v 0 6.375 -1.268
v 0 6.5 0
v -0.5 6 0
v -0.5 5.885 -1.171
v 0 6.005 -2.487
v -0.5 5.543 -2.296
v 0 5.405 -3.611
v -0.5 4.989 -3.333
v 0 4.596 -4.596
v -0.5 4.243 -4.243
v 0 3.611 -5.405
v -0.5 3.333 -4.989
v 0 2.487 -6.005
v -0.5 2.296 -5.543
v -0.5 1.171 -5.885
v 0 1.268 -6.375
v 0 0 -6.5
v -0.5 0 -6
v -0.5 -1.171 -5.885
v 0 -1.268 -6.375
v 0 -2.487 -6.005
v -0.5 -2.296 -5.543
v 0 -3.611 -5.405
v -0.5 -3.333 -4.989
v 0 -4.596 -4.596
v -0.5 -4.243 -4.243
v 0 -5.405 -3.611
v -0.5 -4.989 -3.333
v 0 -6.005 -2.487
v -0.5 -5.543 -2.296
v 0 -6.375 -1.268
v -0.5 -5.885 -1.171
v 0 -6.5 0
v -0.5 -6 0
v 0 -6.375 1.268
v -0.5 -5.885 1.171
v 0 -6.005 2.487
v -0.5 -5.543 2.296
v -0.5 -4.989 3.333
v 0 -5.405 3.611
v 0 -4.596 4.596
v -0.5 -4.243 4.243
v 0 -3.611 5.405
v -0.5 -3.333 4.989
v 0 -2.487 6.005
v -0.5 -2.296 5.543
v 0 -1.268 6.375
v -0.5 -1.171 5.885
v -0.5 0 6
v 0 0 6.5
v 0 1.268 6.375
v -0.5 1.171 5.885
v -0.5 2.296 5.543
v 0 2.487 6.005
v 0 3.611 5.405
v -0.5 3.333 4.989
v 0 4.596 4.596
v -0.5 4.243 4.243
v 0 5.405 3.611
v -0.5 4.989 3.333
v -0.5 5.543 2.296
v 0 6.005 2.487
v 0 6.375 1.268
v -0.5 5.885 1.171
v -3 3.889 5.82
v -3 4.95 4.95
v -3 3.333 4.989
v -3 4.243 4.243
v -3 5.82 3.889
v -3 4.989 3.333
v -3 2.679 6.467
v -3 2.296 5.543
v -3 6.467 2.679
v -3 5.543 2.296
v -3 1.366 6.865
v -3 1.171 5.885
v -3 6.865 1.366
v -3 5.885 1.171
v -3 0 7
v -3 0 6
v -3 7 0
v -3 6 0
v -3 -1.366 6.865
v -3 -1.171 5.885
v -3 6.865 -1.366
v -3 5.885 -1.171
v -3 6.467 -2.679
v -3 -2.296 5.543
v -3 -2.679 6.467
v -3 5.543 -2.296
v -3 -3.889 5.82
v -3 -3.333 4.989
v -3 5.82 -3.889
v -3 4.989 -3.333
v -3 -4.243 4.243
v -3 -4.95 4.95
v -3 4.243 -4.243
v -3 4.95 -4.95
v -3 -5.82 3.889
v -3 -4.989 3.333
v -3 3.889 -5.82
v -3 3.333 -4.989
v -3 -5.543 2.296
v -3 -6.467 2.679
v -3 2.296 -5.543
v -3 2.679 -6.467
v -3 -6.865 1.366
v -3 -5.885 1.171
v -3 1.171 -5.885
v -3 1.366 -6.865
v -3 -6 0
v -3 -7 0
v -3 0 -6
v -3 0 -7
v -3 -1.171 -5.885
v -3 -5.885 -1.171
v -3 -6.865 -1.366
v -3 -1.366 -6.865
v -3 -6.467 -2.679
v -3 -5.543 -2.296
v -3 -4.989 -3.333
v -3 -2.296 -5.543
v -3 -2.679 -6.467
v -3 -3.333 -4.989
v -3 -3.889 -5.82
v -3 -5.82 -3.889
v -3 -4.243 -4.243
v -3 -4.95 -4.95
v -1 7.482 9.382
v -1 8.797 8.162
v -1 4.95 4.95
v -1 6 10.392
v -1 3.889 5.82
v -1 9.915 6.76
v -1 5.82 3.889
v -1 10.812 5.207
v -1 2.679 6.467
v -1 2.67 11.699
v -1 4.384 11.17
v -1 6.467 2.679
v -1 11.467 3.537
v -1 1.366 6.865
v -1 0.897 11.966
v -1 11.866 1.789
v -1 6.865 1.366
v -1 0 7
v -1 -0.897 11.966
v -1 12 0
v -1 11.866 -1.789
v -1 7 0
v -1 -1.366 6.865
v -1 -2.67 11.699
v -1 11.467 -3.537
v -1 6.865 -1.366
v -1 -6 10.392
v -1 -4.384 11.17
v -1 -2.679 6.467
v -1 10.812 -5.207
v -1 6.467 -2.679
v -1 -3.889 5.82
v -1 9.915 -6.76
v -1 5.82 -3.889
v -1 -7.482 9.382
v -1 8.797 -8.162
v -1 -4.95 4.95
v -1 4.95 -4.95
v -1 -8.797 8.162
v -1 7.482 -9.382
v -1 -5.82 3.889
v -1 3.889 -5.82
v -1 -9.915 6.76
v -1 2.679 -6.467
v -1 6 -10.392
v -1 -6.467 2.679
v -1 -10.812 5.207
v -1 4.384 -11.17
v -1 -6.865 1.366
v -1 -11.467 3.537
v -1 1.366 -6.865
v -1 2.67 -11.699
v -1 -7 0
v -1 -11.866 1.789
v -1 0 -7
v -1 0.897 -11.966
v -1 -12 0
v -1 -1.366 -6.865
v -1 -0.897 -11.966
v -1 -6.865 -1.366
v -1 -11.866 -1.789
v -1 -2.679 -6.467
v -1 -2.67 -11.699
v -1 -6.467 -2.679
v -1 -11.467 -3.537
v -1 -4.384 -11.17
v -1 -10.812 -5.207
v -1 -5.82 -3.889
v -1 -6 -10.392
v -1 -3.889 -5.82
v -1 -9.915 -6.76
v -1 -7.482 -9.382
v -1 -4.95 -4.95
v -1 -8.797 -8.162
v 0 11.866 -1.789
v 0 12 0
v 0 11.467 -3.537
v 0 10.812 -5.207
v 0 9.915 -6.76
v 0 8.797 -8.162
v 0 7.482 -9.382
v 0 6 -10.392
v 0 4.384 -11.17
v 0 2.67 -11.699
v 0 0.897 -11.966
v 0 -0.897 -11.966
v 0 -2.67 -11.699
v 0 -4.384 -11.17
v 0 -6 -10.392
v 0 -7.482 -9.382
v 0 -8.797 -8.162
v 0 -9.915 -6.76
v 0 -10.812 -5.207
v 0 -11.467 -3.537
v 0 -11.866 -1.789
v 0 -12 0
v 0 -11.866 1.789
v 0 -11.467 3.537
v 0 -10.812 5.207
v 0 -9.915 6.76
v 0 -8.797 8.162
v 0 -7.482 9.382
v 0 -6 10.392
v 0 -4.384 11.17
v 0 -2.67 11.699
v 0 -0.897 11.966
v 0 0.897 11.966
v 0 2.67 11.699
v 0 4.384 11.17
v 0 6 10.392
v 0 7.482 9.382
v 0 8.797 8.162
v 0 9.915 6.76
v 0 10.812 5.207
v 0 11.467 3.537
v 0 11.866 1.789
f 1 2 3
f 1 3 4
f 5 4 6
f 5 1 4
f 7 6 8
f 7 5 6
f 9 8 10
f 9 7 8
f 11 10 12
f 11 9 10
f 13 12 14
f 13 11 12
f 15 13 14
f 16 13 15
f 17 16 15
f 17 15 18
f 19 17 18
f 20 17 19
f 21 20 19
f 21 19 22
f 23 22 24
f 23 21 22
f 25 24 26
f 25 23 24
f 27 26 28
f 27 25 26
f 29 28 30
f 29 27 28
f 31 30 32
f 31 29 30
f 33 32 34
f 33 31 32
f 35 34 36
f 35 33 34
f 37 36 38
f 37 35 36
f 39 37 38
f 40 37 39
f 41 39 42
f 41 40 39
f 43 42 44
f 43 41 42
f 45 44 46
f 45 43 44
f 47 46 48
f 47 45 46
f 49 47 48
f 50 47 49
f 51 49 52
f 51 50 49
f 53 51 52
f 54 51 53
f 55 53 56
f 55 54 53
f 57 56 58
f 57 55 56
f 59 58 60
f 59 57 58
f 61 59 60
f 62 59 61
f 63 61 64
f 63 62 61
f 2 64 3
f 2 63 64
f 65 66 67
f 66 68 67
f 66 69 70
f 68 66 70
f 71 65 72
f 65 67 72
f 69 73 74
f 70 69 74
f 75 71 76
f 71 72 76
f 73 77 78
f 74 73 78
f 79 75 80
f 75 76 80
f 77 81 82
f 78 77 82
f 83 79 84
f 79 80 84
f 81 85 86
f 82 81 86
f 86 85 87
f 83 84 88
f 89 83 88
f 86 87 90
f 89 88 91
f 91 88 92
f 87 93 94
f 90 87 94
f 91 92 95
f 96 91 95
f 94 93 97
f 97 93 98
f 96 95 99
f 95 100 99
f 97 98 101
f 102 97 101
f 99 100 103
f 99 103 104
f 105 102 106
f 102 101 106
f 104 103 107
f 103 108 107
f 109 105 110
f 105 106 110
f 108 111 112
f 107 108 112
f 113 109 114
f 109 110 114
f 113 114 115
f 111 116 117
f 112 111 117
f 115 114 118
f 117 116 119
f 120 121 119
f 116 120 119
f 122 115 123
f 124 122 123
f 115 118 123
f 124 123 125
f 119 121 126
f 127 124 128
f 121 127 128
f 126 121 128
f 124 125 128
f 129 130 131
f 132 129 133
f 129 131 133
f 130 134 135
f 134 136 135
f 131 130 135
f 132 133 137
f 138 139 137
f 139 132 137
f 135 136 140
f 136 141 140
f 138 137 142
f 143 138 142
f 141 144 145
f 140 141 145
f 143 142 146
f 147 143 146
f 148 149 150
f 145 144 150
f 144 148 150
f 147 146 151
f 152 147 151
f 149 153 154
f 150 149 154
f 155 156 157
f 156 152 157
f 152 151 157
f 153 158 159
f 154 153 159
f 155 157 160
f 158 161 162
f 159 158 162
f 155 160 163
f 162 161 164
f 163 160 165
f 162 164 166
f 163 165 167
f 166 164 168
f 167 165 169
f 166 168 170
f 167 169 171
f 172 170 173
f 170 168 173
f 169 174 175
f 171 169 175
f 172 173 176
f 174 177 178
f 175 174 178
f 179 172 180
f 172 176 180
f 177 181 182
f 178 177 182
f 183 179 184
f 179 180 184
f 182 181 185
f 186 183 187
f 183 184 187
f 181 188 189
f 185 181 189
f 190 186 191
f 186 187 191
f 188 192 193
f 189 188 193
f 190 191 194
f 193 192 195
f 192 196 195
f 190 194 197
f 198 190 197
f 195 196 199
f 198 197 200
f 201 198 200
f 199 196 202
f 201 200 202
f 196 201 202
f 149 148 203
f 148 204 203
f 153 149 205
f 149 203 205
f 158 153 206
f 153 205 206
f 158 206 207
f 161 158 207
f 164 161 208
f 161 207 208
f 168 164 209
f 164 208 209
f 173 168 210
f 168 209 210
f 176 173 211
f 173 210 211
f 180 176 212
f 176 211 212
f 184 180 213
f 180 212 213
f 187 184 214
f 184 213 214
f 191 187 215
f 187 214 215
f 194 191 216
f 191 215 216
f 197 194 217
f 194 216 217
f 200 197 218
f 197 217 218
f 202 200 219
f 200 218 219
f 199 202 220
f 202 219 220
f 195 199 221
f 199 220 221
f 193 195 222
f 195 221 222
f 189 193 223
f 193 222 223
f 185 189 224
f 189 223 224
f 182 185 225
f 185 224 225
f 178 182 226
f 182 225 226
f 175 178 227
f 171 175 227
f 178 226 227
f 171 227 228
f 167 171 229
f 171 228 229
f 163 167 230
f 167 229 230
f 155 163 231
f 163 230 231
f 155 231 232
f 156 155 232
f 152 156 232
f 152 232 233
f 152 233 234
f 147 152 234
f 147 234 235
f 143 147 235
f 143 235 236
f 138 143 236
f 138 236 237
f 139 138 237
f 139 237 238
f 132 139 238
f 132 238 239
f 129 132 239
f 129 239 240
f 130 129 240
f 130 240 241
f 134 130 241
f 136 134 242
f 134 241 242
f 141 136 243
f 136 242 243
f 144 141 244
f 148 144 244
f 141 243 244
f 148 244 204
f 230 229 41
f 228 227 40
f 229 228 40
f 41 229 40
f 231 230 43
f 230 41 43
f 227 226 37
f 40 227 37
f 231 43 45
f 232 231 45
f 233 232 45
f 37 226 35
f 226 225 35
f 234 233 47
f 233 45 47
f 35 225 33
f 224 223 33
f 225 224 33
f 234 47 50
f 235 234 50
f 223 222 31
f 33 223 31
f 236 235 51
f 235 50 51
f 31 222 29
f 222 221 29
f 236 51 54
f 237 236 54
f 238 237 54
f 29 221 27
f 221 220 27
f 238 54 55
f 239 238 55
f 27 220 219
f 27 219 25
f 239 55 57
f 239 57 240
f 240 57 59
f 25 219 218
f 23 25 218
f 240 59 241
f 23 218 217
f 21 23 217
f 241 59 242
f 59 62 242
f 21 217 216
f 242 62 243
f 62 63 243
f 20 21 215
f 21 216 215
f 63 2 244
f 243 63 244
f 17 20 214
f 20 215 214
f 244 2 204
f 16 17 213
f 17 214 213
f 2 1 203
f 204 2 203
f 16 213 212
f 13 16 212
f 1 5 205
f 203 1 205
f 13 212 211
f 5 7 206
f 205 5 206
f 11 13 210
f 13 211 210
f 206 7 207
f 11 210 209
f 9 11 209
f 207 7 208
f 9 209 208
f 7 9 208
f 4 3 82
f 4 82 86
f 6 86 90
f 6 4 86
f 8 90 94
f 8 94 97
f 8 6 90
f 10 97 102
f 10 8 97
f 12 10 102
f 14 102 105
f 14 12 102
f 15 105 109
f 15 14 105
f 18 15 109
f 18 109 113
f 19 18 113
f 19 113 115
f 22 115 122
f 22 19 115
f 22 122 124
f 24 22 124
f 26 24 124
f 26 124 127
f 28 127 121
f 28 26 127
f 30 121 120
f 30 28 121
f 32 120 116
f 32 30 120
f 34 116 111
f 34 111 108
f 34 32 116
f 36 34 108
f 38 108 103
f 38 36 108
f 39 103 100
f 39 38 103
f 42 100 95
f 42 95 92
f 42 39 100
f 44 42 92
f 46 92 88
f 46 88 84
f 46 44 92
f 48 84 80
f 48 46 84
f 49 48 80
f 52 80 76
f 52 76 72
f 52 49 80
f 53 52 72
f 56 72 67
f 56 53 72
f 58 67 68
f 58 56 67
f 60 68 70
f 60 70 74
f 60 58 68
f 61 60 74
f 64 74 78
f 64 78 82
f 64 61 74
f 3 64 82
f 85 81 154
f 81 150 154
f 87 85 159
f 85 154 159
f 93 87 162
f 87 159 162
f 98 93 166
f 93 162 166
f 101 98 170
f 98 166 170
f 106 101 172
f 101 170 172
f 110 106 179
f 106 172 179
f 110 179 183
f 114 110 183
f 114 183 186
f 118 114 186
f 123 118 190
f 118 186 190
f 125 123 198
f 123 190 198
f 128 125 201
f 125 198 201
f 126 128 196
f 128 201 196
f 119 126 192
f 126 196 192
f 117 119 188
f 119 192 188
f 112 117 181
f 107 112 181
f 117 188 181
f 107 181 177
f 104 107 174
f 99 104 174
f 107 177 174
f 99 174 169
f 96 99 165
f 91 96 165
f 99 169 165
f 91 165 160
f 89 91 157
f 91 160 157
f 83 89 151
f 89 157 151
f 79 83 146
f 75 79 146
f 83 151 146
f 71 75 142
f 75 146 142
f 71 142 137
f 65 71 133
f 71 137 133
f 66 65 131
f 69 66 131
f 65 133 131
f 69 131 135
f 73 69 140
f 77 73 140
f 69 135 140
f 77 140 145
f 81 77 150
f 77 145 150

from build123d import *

# Parameters (mm, degrees)
CHAMFER1_SIZE = 0.5


with BuildPart() as part:
    # Sketch1 → Revolve1 (revolve)
    with BuildSketch(Plane.XY):
        Polygon((0, 6), (-1, 6), (-3, 6), (-3, 7), (-1, 7), (-1, 12), (0, 12), align=None)
    revolve(axis=Axis((0, 0, 0), (-1, 0, 0)))

    # Chamfer1
    chamfer1_edges = [part.edges().sort_by_distance(p)[0] for p in [
        (0, -6, 0),
    ]]
    chamfer(chamfer1_edges, length=CHAMFER1_SIZE)


solid = part.part
